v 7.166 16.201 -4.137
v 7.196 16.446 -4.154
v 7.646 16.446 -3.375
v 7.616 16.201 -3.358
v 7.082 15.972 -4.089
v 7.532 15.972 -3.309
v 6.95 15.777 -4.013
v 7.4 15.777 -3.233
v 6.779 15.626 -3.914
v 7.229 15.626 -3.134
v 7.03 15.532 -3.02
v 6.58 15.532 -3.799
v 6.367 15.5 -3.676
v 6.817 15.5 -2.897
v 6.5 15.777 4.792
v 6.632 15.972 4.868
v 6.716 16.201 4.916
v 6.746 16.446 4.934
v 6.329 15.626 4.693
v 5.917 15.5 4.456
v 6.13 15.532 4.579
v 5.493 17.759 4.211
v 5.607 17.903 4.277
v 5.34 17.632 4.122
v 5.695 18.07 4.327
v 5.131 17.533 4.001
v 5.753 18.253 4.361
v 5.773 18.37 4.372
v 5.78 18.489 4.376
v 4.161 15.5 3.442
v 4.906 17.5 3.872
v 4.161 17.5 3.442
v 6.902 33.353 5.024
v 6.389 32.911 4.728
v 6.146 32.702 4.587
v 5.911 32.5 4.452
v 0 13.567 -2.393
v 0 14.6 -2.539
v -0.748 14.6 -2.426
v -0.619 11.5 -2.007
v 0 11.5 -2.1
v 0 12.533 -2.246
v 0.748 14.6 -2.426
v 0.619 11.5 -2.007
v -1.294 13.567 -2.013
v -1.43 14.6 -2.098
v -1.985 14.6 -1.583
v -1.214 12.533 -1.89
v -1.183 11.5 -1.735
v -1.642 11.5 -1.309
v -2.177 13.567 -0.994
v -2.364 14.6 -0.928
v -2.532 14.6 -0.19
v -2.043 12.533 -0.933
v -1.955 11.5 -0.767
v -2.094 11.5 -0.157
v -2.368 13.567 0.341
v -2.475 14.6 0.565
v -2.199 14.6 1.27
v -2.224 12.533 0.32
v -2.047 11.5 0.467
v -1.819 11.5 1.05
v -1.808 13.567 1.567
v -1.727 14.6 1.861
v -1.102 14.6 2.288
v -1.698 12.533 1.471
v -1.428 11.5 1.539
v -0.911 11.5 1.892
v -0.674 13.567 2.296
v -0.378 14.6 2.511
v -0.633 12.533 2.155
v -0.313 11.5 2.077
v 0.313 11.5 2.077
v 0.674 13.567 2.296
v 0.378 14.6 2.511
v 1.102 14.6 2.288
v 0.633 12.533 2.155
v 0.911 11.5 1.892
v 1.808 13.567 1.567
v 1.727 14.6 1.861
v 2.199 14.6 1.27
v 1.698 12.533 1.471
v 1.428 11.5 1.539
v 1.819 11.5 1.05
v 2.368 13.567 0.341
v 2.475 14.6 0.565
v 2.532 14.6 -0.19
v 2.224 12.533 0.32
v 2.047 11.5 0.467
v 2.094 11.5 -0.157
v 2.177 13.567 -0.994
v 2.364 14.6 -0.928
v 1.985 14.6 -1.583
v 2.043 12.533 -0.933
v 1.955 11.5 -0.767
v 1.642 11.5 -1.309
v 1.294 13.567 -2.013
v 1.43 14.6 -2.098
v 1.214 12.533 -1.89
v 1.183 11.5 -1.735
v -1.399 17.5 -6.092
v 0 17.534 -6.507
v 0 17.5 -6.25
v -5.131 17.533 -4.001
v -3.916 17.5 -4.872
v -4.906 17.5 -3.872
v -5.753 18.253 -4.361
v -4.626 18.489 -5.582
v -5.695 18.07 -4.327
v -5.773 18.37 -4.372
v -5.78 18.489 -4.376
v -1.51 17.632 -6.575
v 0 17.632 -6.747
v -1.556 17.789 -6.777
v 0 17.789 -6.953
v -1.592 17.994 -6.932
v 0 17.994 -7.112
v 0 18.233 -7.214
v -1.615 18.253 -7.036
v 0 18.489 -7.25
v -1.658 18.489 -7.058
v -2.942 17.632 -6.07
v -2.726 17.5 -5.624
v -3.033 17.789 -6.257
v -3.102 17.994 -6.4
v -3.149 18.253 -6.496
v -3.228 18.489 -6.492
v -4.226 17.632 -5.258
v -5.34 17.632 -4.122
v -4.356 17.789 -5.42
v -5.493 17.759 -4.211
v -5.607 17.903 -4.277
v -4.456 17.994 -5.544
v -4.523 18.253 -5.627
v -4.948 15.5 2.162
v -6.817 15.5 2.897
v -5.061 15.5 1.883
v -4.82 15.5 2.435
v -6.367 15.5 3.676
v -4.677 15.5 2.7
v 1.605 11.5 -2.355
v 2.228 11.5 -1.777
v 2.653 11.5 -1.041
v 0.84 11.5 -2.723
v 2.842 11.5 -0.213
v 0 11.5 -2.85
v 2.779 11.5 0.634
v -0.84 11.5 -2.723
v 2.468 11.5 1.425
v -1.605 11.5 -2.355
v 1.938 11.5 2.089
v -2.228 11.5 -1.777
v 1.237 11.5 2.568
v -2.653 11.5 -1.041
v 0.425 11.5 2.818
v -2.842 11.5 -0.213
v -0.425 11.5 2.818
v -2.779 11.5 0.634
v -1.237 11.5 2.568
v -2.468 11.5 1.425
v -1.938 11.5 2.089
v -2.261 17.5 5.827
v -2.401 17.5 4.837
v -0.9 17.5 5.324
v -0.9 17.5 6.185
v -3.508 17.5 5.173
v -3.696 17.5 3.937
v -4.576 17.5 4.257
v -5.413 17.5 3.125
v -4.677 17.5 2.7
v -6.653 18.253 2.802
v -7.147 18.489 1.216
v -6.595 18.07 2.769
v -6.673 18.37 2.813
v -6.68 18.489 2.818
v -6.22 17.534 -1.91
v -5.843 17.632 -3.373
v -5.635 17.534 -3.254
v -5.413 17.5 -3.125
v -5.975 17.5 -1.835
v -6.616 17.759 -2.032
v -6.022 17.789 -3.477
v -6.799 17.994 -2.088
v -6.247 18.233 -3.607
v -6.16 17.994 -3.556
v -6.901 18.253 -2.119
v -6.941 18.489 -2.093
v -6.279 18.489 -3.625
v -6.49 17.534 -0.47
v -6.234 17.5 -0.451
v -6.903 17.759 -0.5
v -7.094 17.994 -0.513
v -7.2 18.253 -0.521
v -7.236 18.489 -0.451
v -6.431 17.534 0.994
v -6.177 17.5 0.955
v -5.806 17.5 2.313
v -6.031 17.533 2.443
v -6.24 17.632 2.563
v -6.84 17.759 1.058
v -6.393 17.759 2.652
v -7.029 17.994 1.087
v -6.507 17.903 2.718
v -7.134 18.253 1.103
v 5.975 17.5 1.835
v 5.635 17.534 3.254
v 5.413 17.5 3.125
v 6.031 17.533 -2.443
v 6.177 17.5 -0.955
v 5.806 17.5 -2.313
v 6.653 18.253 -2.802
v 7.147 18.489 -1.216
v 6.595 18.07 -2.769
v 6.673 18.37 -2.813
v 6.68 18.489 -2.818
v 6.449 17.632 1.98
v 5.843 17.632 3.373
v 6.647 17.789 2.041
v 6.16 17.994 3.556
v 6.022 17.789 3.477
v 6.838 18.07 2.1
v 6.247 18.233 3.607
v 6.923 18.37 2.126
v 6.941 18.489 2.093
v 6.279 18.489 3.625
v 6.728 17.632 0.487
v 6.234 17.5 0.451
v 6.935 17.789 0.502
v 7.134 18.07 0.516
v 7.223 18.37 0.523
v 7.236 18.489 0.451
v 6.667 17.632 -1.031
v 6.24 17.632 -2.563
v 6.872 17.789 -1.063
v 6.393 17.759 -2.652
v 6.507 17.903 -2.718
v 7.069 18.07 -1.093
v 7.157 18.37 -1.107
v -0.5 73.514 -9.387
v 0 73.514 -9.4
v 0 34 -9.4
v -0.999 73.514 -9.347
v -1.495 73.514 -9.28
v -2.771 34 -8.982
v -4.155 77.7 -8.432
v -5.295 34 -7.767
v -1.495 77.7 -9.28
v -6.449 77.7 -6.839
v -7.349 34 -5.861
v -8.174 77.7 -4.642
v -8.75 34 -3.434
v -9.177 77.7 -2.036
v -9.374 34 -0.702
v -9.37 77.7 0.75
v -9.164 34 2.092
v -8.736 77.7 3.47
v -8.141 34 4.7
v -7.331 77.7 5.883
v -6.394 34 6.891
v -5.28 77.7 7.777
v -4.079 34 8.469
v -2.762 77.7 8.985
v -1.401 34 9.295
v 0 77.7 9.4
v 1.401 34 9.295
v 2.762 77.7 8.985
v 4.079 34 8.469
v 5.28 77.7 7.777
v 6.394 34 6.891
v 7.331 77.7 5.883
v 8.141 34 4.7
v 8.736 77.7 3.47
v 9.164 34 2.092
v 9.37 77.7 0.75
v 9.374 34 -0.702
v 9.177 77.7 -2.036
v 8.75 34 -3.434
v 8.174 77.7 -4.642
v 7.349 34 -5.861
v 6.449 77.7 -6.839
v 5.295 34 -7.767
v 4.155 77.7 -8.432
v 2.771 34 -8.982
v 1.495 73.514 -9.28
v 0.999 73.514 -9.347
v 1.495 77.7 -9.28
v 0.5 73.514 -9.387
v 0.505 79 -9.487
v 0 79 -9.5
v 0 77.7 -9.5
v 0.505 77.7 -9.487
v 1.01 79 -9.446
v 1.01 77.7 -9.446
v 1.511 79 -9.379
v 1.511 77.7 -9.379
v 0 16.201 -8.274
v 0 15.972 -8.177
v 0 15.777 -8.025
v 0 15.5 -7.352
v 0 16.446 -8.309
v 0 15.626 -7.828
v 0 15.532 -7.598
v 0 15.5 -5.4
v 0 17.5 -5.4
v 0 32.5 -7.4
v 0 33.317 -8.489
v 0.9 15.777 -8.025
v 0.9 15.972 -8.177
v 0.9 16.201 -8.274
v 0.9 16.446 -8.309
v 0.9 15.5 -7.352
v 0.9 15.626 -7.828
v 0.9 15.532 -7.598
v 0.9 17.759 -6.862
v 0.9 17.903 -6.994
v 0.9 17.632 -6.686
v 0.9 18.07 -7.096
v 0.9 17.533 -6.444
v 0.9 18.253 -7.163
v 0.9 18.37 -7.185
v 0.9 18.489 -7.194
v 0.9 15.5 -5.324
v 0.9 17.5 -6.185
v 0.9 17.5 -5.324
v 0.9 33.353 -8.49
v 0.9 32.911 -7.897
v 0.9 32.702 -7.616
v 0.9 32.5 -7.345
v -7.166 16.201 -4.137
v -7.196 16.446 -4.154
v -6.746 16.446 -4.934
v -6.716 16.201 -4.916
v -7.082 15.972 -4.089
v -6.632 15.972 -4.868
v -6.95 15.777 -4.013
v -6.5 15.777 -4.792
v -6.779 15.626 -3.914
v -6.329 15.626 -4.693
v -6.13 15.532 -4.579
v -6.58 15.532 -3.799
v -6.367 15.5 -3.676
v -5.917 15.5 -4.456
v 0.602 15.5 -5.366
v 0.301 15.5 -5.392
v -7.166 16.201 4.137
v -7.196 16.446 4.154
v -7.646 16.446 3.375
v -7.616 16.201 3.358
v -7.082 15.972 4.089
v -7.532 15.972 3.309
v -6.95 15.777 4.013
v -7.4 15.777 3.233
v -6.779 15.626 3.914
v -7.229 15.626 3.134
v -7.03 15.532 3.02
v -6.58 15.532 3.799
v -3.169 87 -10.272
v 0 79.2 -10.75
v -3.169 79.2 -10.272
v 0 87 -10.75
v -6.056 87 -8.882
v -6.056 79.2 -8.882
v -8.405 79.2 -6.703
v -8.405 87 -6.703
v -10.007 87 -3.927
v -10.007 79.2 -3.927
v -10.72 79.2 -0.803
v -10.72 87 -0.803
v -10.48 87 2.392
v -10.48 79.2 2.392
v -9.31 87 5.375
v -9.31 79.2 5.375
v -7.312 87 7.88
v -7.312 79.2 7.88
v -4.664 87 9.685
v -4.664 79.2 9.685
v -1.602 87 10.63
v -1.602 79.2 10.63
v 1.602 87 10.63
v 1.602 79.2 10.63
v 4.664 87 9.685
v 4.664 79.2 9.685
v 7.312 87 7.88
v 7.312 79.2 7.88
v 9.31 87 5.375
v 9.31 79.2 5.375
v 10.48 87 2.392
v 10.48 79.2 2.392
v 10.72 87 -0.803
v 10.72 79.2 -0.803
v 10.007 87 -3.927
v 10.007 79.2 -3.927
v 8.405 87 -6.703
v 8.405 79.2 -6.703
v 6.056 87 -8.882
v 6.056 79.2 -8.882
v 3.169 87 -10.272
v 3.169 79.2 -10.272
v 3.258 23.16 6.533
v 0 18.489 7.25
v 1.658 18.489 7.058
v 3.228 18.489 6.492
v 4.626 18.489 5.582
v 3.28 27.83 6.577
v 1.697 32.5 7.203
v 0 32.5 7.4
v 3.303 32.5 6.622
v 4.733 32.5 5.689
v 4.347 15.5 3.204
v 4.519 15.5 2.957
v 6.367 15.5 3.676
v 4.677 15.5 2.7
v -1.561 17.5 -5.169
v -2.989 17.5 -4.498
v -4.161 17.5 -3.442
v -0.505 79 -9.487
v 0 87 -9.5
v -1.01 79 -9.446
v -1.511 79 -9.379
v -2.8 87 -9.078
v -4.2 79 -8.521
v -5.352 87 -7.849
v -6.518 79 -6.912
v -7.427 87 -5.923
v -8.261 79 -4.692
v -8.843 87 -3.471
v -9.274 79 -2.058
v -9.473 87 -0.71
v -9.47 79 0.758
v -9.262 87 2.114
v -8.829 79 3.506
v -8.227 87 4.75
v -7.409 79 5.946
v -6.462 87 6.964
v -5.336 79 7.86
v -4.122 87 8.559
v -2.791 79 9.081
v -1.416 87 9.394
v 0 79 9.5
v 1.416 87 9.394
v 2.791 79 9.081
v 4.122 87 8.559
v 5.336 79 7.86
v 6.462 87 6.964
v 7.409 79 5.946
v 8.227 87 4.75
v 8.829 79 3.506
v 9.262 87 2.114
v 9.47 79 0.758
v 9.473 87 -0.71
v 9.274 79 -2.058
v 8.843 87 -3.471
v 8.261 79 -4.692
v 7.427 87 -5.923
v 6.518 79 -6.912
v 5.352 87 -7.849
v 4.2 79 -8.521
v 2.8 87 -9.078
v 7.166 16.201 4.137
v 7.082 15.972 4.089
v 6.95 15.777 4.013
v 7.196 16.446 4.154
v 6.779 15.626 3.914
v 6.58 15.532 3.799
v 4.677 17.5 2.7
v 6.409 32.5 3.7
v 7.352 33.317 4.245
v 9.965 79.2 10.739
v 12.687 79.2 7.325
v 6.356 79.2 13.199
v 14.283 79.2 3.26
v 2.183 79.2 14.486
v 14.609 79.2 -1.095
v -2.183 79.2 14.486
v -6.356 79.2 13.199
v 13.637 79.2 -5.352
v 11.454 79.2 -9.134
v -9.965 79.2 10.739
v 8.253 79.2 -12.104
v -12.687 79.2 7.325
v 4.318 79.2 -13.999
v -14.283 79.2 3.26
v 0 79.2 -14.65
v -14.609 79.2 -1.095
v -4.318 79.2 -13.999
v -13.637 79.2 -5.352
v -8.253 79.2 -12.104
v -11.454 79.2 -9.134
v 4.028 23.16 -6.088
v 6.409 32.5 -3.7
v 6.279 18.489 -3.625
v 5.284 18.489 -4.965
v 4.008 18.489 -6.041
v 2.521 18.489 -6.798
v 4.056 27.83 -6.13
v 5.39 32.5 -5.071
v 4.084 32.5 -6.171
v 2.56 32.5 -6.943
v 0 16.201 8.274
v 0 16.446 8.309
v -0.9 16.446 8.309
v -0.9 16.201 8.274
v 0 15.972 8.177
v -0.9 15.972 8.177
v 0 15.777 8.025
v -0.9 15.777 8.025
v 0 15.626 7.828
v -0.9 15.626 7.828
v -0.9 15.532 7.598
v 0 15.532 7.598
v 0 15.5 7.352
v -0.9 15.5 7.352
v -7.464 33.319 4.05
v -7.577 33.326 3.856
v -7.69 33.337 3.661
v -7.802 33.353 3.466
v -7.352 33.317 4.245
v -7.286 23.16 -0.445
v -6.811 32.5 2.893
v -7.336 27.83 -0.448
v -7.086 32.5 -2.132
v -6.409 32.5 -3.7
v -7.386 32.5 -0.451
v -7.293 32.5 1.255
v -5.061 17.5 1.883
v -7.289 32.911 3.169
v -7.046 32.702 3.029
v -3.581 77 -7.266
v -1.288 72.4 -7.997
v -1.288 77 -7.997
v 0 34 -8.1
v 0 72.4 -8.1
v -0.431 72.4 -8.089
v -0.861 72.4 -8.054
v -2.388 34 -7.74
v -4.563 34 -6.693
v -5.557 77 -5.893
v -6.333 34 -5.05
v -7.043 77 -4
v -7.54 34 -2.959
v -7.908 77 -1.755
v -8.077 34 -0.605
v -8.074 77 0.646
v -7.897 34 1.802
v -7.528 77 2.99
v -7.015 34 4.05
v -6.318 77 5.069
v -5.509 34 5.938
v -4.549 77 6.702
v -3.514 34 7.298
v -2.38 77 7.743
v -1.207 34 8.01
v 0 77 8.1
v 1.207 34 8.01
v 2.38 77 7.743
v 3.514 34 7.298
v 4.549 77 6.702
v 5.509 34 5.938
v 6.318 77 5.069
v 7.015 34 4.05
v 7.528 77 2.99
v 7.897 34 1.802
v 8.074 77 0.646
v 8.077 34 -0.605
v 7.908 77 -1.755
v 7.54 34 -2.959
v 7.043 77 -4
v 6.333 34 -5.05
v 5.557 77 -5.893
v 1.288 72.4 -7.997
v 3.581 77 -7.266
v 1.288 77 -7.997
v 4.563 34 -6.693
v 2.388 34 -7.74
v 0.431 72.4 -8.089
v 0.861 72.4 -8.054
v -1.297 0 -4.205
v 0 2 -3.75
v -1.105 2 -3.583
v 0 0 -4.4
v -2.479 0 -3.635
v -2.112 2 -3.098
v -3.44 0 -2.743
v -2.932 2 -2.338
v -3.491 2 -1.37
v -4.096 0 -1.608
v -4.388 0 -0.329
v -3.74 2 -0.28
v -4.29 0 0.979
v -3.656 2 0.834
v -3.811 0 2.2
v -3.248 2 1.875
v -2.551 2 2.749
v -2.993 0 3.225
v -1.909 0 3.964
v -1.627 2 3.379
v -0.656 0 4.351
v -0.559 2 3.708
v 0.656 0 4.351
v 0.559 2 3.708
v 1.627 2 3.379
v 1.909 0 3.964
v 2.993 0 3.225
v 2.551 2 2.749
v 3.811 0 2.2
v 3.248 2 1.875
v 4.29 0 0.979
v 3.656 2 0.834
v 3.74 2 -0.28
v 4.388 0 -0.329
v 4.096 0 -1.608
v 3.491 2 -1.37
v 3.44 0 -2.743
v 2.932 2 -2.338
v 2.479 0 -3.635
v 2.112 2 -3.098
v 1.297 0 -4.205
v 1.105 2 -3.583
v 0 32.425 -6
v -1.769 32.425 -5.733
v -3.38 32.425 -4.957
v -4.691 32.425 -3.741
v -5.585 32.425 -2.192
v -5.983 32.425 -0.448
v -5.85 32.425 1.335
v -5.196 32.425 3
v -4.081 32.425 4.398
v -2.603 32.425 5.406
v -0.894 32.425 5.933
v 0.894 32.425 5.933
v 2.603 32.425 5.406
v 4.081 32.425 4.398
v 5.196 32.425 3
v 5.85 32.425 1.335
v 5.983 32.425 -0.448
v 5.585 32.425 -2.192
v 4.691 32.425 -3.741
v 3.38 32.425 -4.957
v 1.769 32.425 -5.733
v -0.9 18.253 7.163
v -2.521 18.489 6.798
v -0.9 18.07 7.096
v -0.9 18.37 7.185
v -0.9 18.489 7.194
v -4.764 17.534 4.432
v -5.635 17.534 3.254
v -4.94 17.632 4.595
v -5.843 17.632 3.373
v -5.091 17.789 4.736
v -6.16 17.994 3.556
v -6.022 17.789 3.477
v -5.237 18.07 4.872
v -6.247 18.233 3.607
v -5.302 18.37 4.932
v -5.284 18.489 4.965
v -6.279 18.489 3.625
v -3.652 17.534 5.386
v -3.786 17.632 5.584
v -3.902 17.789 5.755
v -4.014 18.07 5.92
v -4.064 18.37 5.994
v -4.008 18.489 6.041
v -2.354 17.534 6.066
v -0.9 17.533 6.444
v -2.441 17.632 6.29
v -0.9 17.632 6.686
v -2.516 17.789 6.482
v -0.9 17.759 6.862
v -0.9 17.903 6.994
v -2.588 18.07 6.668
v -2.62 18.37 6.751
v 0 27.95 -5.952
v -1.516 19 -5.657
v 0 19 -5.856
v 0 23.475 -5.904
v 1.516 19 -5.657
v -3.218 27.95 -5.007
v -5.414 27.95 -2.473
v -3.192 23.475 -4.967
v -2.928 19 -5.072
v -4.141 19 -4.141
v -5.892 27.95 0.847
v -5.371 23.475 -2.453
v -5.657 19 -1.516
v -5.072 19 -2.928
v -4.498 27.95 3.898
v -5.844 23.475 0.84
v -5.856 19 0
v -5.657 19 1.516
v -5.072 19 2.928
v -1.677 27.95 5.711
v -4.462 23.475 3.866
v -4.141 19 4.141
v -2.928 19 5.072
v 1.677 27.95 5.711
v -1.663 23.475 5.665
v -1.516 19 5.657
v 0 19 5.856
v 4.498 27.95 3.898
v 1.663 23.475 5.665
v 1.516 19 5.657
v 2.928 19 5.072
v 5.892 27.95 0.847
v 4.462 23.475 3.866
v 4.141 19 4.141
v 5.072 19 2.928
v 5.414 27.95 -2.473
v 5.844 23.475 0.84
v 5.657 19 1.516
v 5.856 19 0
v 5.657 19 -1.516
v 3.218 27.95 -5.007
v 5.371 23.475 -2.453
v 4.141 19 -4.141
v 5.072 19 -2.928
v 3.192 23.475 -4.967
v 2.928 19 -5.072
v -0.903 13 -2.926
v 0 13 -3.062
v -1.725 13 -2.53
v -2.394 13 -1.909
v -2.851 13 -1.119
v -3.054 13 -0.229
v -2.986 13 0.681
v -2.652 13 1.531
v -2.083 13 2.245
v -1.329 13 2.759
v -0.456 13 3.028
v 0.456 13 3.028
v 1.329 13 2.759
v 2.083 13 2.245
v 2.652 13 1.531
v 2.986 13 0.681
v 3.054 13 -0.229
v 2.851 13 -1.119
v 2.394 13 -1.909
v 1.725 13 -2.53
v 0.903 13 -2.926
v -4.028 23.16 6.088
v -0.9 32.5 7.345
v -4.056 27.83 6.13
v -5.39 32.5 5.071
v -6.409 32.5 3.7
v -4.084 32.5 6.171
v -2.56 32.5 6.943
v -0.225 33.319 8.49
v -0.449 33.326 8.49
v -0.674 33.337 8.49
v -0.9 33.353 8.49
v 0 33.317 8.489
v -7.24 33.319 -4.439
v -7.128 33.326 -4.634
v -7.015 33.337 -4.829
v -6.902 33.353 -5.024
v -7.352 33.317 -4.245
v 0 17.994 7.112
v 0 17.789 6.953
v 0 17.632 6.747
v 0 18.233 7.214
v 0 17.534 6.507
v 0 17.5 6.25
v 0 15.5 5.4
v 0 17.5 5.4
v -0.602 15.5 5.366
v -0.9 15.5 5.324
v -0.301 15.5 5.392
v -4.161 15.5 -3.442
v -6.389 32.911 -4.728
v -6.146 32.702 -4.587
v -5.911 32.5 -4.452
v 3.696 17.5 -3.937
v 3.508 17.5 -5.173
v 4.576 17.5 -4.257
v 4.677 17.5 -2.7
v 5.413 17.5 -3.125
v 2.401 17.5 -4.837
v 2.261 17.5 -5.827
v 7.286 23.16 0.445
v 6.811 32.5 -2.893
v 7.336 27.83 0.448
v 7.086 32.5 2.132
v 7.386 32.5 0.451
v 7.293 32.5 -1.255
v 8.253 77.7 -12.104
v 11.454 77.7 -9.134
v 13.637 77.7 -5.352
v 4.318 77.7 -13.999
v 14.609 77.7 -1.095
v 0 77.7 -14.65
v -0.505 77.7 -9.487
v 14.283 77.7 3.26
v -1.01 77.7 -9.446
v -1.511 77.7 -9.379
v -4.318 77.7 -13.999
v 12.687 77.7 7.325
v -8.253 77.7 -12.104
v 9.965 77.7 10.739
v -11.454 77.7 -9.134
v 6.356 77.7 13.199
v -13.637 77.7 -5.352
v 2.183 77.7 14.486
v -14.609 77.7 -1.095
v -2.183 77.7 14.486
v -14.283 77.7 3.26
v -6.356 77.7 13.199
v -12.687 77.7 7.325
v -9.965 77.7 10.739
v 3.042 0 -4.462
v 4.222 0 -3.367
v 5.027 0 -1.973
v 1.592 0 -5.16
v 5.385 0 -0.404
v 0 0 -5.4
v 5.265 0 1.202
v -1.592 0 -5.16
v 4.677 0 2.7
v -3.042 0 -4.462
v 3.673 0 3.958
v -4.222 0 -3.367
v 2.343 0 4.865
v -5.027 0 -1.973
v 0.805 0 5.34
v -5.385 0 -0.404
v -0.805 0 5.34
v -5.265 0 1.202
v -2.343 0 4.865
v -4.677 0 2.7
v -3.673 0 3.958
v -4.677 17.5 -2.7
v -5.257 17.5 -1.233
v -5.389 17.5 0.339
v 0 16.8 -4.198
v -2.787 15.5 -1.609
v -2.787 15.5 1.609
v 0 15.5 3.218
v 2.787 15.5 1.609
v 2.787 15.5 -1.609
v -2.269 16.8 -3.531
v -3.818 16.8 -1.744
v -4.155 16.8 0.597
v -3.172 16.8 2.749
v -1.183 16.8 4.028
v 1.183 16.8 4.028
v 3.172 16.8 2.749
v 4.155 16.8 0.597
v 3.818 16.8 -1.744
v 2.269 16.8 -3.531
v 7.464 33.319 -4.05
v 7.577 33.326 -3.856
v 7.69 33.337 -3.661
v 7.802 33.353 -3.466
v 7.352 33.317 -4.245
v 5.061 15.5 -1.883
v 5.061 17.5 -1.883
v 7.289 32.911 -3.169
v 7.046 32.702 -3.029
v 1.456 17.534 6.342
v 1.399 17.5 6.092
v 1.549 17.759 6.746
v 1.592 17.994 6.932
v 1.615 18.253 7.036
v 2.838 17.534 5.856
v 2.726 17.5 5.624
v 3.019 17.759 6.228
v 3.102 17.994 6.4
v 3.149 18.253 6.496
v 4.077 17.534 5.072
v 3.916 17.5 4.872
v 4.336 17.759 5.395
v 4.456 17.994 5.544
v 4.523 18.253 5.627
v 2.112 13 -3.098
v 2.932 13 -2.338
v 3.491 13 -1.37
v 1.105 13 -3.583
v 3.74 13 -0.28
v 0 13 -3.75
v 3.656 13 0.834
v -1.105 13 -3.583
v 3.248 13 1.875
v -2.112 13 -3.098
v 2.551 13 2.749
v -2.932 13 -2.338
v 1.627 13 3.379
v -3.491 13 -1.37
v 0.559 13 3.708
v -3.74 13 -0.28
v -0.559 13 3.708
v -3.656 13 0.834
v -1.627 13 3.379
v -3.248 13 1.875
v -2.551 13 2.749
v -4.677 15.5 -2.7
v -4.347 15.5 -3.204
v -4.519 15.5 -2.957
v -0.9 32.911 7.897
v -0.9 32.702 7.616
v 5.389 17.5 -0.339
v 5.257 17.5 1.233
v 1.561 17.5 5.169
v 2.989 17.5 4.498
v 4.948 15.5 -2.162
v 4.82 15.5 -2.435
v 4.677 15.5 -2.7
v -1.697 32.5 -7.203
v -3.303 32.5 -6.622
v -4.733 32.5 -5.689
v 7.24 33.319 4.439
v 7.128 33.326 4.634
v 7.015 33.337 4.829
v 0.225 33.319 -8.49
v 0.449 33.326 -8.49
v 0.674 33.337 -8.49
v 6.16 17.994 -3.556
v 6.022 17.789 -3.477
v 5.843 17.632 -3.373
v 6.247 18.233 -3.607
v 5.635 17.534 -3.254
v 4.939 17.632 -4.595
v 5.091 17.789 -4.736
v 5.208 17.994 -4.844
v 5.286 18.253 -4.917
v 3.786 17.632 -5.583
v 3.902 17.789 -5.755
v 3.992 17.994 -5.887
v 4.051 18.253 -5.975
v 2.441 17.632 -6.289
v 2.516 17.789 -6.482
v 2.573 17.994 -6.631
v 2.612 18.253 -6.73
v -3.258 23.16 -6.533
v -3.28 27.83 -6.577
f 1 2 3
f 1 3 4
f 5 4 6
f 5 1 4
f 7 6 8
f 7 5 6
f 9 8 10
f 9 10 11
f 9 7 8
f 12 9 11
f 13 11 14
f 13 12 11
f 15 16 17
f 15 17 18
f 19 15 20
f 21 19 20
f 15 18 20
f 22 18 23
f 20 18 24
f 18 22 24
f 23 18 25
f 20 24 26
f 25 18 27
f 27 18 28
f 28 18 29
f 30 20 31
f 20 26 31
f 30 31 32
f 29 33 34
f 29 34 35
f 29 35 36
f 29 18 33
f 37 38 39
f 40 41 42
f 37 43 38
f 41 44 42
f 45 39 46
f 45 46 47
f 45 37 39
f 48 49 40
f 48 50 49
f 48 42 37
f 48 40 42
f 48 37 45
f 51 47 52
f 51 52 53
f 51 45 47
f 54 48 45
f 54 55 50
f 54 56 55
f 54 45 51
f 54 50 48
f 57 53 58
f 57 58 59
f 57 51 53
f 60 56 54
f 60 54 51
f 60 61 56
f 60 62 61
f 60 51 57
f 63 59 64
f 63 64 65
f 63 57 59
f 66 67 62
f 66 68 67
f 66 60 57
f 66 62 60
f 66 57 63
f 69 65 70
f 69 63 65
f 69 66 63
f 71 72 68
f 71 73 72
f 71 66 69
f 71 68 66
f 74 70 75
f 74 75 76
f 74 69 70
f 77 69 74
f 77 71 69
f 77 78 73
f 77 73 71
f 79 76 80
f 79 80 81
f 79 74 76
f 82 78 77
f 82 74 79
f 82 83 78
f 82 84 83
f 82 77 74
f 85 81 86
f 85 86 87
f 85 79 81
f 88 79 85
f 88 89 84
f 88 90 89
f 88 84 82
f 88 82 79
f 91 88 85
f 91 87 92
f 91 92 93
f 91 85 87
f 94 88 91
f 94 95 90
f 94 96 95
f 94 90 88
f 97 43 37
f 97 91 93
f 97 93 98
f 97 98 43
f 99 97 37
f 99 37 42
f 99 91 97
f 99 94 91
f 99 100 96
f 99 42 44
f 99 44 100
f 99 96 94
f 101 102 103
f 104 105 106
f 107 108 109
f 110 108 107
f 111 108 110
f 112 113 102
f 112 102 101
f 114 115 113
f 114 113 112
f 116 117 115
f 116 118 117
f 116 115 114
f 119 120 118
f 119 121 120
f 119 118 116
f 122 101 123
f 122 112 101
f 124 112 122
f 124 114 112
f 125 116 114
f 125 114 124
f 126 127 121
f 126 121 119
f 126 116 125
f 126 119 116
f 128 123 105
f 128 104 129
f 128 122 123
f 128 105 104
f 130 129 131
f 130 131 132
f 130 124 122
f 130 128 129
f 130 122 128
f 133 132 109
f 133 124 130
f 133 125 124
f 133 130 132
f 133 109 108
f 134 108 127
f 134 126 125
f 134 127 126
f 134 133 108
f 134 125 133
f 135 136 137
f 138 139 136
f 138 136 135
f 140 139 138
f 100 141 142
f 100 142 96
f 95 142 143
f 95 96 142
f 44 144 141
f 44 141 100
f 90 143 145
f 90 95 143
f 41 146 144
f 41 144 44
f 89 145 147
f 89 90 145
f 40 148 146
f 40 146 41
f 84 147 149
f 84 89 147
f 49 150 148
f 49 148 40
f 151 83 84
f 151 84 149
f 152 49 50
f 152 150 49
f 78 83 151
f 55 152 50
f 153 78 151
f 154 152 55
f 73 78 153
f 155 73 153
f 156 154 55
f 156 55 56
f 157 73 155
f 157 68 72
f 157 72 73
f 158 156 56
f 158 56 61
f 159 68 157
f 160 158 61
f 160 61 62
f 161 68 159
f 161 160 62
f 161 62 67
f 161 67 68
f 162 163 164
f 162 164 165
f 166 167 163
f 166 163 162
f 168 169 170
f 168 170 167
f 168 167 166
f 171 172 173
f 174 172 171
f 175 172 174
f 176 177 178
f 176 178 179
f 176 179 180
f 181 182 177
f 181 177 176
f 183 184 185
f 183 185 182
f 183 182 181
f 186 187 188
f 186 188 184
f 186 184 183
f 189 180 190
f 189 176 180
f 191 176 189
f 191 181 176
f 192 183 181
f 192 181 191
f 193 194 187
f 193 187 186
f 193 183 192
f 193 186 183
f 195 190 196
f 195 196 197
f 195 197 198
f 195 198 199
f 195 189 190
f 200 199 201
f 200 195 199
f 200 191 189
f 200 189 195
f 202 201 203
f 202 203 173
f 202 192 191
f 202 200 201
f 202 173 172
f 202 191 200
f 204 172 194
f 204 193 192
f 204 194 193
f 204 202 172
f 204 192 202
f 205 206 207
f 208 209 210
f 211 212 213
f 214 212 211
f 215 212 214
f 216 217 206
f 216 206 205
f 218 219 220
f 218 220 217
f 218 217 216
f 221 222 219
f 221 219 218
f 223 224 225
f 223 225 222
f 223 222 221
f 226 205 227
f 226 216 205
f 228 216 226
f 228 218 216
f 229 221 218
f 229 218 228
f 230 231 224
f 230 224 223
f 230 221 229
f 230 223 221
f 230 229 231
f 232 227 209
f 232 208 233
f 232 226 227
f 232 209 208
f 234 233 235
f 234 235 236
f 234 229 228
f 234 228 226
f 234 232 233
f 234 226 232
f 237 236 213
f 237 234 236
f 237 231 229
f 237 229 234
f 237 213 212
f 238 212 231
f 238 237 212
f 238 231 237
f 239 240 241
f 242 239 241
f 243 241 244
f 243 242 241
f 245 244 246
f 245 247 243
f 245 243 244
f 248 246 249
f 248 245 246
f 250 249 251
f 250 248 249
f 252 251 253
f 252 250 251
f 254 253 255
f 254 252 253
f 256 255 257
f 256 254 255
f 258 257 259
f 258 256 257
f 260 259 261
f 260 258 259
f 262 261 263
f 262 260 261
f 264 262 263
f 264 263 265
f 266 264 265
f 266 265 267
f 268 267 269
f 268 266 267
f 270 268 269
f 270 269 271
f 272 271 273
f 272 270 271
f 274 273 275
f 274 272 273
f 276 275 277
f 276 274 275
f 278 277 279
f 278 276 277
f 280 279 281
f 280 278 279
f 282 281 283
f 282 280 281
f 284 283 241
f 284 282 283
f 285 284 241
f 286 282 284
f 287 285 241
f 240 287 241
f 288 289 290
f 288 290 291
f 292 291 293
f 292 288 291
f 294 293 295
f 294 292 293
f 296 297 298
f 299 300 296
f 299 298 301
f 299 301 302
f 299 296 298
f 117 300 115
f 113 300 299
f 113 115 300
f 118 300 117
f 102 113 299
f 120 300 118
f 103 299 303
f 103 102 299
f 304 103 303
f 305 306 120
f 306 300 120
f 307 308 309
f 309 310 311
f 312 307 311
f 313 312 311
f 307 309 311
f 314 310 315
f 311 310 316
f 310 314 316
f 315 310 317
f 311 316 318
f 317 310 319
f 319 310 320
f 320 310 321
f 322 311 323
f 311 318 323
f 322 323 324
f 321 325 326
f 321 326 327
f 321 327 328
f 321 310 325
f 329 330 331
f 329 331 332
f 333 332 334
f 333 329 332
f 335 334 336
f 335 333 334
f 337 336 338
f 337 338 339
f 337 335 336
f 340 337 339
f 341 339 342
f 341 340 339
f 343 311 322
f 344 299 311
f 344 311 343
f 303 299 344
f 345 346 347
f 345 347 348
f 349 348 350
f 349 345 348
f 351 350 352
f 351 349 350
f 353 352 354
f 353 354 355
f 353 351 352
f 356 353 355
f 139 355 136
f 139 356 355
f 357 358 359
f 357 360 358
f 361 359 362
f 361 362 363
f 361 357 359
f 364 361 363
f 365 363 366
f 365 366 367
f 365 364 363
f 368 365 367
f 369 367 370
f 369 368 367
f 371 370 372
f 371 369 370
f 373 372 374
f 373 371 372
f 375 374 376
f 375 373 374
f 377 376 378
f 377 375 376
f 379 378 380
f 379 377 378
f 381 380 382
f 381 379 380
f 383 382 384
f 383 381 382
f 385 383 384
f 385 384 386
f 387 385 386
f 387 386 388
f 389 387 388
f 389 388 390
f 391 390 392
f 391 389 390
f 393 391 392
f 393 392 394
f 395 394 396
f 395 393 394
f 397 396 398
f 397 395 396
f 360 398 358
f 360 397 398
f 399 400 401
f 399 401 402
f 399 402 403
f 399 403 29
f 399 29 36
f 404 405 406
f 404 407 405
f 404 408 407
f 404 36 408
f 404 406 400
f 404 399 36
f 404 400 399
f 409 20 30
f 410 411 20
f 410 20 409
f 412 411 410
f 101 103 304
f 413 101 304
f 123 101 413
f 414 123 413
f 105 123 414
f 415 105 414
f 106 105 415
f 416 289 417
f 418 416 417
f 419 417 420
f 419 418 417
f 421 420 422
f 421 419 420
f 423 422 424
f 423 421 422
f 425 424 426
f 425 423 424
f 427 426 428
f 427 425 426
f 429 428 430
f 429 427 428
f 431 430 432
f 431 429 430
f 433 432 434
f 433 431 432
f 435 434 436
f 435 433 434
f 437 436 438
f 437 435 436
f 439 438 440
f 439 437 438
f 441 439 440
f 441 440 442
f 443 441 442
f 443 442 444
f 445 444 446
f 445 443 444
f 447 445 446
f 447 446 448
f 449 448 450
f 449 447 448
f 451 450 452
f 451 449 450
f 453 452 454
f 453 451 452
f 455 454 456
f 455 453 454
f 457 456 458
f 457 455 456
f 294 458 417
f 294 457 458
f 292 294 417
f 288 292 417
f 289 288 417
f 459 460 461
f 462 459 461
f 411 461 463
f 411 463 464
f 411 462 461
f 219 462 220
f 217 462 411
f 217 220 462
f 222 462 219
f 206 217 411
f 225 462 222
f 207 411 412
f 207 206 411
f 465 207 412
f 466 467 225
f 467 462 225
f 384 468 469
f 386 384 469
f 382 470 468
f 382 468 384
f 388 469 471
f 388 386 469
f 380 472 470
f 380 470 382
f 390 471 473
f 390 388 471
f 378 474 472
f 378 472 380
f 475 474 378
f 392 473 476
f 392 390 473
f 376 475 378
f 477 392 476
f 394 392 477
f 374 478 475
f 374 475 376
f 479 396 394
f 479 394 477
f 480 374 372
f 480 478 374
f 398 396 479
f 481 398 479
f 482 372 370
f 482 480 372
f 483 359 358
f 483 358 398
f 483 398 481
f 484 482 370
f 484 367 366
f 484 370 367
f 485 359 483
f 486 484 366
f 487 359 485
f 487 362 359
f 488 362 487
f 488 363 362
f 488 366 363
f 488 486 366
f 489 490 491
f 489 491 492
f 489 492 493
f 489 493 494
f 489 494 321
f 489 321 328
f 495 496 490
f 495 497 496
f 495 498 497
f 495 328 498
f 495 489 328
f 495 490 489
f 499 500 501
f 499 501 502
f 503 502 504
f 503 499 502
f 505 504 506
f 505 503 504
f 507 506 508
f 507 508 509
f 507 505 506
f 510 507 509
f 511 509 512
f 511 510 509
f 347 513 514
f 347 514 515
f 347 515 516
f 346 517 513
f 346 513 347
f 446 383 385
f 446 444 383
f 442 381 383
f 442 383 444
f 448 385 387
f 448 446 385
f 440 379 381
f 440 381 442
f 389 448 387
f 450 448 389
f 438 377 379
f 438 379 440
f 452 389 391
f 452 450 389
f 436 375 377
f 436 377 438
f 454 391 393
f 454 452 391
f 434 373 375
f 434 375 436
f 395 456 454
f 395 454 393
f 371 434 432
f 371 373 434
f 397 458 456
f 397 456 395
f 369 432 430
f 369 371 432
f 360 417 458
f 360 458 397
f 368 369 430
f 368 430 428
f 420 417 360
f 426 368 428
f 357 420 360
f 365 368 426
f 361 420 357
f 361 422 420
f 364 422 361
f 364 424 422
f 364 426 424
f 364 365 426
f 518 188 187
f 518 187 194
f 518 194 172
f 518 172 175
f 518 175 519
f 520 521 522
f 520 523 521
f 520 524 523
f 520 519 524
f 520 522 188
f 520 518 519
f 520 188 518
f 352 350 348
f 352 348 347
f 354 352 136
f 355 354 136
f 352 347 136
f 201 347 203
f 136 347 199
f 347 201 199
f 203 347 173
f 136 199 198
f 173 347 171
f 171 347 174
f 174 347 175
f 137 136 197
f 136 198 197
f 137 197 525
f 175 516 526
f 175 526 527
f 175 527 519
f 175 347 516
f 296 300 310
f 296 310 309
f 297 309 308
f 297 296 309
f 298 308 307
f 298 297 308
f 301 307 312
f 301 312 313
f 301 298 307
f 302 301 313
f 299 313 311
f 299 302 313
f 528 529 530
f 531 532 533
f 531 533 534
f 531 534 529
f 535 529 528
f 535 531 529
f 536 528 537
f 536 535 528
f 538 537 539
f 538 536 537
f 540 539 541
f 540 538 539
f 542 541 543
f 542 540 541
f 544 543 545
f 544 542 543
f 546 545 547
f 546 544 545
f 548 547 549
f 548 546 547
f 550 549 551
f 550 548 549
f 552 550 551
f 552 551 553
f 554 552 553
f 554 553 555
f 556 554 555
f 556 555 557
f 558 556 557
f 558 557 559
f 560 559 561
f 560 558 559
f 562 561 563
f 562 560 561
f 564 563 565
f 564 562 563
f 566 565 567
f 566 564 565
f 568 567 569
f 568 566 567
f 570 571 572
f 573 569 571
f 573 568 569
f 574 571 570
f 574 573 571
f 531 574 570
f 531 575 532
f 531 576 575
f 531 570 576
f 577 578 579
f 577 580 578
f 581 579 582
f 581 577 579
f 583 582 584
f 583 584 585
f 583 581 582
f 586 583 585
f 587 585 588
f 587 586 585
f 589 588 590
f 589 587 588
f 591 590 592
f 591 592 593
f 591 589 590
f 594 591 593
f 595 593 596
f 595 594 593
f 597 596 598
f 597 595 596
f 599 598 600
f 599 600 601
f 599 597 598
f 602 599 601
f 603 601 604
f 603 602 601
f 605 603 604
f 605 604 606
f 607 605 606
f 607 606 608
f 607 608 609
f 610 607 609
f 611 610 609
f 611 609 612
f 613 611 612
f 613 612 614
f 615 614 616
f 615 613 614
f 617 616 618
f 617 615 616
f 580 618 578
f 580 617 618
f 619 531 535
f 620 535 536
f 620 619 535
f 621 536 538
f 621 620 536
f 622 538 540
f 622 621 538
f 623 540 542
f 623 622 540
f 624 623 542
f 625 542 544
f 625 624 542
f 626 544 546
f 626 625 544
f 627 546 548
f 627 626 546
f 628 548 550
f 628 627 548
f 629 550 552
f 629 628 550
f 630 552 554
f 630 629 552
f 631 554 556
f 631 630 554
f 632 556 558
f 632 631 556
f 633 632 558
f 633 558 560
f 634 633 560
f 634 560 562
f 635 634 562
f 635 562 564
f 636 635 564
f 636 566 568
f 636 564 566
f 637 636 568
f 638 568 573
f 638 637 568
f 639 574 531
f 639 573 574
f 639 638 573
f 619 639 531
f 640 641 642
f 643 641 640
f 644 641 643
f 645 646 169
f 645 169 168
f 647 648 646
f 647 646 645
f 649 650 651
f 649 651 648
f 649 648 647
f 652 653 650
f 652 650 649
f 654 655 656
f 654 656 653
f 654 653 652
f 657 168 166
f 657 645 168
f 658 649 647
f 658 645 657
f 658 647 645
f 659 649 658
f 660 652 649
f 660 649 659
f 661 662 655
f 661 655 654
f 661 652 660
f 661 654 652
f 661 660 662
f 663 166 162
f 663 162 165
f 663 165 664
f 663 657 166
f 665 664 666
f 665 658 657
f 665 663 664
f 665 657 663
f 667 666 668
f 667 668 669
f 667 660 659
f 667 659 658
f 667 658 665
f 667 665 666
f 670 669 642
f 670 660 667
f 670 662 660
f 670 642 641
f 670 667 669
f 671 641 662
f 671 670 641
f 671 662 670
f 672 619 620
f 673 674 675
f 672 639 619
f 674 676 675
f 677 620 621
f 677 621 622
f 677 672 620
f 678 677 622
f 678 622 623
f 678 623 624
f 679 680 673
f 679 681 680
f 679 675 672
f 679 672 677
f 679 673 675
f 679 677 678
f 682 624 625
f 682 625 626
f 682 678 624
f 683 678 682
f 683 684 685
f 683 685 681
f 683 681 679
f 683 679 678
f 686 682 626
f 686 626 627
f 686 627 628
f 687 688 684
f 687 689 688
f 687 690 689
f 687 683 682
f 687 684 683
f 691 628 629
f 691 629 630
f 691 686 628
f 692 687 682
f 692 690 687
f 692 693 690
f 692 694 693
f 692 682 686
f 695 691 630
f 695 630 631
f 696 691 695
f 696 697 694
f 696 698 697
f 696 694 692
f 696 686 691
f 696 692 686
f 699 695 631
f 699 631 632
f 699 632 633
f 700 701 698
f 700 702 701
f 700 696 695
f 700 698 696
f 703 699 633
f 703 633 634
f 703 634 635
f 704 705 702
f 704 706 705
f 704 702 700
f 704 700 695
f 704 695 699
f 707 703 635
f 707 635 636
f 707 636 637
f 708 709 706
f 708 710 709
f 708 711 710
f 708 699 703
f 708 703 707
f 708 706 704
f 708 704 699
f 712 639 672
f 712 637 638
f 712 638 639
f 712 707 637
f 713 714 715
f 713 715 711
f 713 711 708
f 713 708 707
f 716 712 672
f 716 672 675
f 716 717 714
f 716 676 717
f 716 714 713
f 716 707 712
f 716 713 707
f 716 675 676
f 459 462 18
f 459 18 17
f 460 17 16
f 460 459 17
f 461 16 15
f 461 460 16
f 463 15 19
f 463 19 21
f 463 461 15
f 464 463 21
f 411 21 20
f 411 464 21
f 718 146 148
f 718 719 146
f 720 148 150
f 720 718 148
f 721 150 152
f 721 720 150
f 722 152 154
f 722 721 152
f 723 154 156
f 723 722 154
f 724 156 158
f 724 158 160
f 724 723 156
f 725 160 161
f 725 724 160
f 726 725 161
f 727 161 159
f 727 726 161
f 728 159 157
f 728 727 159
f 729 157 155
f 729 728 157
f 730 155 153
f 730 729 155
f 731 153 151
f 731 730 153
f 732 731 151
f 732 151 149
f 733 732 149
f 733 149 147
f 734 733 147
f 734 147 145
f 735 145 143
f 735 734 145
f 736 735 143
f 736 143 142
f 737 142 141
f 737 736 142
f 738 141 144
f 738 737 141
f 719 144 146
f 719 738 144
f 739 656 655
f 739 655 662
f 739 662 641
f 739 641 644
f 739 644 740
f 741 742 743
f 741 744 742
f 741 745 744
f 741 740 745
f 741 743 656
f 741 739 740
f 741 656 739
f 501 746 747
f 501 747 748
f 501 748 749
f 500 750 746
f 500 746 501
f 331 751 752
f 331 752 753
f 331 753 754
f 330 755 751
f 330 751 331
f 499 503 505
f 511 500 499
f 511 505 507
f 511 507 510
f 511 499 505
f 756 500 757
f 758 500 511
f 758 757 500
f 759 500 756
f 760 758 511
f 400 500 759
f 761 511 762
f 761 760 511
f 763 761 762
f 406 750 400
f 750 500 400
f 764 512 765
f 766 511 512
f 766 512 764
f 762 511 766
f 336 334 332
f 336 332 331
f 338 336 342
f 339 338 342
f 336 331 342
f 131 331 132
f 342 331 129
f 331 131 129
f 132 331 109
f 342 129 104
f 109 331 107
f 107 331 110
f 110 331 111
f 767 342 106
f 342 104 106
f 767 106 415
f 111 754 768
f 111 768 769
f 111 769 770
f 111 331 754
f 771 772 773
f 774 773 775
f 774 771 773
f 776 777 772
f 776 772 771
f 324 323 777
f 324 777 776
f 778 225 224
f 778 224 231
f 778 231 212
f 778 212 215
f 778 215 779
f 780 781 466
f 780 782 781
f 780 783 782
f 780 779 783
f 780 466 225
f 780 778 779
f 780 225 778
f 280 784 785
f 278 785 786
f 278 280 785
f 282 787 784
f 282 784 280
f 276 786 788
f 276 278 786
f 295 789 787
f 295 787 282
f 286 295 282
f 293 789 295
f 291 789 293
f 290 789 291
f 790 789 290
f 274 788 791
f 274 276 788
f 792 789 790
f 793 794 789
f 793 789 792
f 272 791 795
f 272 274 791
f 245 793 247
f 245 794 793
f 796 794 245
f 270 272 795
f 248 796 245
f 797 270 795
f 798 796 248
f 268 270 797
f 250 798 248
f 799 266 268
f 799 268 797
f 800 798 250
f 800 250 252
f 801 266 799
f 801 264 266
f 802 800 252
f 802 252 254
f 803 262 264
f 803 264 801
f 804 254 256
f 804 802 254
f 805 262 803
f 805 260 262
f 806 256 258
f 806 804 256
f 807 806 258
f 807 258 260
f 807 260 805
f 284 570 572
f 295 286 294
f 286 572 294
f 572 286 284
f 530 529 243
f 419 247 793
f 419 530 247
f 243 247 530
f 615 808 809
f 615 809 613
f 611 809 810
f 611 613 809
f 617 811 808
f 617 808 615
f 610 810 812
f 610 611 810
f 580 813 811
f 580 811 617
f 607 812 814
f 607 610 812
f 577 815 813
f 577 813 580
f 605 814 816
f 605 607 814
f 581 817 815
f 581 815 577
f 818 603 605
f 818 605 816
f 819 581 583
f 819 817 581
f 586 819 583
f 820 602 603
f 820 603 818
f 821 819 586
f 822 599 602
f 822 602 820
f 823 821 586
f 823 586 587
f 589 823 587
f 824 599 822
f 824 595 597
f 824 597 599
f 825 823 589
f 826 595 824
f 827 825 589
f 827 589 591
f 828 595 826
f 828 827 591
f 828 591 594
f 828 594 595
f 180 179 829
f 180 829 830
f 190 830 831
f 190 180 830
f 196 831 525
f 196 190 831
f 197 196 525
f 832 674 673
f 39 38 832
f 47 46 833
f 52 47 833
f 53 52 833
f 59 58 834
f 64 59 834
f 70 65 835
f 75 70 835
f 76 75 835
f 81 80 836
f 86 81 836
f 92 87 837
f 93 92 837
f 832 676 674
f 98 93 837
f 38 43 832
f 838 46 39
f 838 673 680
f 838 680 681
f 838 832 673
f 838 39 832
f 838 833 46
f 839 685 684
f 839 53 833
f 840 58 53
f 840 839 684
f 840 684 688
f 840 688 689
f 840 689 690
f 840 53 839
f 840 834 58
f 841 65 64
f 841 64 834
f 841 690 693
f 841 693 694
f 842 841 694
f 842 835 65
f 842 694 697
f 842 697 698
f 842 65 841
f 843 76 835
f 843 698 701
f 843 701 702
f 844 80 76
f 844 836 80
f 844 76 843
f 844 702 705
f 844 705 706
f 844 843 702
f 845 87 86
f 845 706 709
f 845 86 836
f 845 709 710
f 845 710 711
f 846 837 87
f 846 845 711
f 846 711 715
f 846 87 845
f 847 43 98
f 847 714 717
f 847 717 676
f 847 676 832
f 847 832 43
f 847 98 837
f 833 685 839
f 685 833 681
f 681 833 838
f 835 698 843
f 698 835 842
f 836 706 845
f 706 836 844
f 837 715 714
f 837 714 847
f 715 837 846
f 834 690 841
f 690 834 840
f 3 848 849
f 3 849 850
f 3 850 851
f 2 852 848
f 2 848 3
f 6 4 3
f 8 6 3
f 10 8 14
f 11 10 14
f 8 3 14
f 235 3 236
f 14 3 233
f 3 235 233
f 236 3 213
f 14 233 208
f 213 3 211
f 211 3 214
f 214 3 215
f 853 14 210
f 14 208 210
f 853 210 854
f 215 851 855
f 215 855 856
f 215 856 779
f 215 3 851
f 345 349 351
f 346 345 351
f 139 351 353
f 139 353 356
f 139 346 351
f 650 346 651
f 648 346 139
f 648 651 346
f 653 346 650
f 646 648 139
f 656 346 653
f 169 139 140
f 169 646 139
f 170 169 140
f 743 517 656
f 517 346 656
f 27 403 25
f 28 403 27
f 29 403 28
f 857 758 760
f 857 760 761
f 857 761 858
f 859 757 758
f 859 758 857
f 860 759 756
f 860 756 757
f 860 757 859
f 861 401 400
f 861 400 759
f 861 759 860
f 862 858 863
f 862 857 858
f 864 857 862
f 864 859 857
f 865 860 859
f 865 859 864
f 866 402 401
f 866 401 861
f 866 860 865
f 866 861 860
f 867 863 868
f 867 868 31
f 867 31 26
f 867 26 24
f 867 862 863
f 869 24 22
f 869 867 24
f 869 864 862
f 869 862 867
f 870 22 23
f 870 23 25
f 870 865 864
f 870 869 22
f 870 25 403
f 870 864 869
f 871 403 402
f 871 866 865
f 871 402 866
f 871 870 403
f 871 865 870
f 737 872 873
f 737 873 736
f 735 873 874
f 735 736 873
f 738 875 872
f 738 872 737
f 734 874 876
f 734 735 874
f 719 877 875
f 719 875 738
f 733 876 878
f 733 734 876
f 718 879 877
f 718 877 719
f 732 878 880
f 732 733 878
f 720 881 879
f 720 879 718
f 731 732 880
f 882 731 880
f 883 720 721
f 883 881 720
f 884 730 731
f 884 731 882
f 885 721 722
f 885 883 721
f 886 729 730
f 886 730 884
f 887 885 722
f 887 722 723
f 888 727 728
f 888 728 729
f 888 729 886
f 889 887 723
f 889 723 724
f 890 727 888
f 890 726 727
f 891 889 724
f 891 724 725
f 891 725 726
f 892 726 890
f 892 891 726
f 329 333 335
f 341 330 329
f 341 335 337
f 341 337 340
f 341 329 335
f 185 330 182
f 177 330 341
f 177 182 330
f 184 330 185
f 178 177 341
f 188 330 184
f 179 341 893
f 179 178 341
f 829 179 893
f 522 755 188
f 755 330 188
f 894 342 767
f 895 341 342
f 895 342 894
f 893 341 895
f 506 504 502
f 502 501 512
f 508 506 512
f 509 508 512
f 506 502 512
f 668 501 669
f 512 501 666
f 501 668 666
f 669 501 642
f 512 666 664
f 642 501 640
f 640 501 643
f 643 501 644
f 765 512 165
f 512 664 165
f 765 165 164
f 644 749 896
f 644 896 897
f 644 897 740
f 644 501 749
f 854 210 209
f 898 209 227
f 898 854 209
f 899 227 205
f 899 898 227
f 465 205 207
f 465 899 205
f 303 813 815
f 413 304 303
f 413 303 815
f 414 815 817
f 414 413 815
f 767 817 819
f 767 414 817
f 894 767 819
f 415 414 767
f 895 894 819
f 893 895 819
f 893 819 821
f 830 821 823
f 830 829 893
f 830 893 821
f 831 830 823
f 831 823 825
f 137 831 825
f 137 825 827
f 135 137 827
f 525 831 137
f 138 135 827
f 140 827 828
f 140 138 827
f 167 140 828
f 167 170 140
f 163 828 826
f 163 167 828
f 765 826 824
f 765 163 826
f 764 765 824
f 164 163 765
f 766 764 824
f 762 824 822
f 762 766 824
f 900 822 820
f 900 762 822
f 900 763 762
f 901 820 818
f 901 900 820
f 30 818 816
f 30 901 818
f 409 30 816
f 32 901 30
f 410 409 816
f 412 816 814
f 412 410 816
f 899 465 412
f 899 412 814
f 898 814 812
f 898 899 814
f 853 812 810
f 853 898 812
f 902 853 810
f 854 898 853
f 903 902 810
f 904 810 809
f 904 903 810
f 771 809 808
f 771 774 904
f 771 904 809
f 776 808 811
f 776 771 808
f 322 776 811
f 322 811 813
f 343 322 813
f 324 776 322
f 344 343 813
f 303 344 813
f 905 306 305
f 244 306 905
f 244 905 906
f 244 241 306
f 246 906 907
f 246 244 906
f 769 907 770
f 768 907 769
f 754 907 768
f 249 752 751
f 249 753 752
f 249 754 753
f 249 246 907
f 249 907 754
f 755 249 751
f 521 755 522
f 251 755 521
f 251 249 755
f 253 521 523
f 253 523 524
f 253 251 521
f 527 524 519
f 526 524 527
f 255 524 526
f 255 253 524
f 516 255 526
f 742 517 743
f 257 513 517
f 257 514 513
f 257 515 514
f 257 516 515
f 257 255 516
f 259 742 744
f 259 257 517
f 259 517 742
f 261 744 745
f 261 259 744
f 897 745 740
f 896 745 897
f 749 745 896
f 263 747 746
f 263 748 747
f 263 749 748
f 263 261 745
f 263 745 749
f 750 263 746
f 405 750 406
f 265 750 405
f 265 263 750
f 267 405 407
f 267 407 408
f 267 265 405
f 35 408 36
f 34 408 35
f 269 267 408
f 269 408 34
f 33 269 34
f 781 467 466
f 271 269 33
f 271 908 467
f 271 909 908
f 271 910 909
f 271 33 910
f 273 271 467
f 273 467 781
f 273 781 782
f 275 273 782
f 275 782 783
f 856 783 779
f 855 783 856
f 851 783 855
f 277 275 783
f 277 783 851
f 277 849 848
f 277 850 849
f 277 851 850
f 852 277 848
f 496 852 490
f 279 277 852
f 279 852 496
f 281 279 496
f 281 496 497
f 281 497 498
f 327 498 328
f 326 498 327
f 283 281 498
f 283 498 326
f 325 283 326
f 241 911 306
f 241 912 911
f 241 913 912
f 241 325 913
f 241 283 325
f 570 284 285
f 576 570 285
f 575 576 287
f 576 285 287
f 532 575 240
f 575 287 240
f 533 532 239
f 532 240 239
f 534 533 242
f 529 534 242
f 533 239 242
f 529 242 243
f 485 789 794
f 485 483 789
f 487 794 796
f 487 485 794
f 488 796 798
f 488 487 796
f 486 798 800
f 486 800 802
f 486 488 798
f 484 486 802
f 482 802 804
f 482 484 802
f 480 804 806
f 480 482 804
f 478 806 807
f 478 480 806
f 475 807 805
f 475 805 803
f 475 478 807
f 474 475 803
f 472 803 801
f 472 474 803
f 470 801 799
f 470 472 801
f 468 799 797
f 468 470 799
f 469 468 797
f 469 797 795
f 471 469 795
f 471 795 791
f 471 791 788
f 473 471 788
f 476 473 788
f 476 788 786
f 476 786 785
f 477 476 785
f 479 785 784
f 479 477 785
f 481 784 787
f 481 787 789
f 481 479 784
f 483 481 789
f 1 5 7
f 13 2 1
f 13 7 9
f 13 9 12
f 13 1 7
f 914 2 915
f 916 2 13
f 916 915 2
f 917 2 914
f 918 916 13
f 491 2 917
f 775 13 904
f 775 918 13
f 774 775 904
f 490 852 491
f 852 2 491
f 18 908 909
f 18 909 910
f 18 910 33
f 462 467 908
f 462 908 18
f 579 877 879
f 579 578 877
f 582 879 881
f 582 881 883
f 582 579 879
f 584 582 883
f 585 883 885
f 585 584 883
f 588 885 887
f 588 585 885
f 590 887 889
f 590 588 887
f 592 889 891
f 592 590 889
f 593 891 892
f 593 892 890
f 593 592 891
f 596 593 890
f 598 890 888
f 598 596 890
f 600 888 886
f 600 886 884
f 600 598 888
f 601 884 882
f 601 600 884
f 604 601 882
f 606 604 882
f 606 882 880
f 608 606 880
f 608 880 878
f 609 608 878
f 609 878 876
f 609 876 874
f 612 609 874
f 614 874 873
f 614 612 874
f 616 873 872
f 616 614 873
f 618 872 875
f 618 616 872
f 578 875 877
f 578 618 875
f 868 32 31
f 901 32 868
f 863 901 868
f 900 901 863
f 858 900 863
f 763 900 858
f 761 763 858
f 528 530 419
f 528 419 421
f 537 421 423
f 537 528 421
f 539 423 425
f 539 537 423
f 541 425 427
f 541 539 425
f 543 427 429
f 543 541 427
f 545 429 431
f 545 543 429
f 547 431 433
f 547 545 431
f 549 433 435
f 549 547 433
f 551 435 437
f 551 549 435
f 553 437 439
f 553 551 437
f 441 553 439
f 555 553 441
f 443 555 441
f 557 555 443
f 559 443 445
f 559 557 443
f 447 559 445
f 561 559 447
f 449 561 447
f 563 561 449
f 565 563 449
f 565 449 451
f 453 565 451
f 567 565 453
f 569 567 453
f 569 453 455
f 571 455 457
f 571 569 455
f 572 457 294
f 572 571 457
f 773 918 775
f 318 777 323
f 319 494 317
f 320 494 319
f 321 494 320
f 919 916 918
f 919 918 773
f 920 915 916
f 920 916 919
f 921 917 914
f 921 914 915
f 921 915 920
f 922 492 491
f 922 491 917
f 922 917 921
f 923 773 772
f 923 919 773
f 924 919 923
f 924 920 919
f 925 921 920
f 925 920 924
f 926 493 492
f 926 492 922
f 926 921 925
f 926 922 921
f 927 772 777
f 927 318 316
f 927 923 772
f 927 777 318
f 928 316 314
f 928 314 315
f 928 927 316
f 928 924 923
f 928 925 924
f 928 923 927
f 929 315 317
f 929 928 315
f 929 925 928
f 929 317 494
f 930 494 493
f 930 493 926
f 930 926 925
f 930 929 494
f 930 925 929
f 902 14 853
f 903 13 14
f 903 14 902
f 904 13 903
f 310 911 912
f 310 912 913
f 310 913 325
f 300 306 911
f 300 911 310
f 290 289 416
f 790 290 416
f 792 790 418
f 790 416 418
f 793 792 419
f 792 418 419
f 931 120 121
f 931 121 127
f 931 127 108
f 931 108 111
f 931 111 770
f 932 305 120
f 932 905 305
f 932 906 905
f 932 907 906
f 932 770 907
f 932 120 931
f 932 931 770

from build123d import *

# Parameters (mm, degrees)
BOSS_EXTRUDE2_DEPTH = 0.9
CIRPATTERN1_COUNT   = 6
CUT_REVOLVE2_ANGLE  = 18.3


with BuildPart() as part:
    # Sketch3 → Revolve2 (revolve)
    with BuildSketch(Plane(origin=(0, 0, 0), x_dir=(0, 0, -1), z_dir=(1, 0, 0))):
        with BuildLine():
            Line((5.4, 0), (5.4, 17.5))
            Line((5.4, 17.5), (6.250057305, 17.5))
            ThreePointArc((6.250057305, 17.5), (6.953368941, 17.789118334), (7.25, 18.489294515))
            Line((7.25, 18.489294515), (7.4, 32.5))
            Line((7.4, 32.5), (9.4, 34))
            Line((9.4, 34), (9.4, 77.7))
            Line((9.4, 77.7), (14.65, 77.7))
            Line((14.65, 77.7), (14.65, 79.2))
            Line((14.65, 79.2), (10.75, 79.2))
            Line((10.75, 79.2), (10.75, 87))
            Line((10.75, 87), (9.5, 87))
            Line((9.5, 87), (9.5, 79))
            Line((9.5, 79), (8.1, 77))
            Line((8.1, 77), (8.1, 34))
            Line((8.1, 34), (6, 32.425))
            Line((6, 32.425), (5.856270621, 19))
            Line((5.856270621, 19), (2.539122418, 14.6))
            Line((2.539122418, 14.6), (2.1, 11.5))
            Line((2.1, 11.5), (2.85, 11.5))
            Line((2.85, 11.5), (3.062478589, 13))
            Line((3.062478589, 13), (3.75, 13))
            Line((3.75, 13), (3.75, 2))
            Line((3.75, 2), (4.4, 0))
            Line((4.4, 0), (5.4, 0))
        make_face()
    revolve(axis=Axis((0, 0, 0), (0, 1, 0)))

    # Sketch4 → Boss-Extrude2 (add)
    with BuildSketch(Plane(origin=(0, 0, 0), x_dir=(0, 0, -1), z_dir=(1, 0, 0))):
        with BuildLine():
            Line((8.5, 34.3), (8.308857775, 16.446417237))
            ThreePointArc((8.308857775, 16.446417237), (8.025083083, 15.776587579), (7.352253864, 15.5))
            Line((7.352253864, 15.5), (3.217630005, 15.5))
            Line((3.217630005, 15.5), (5.856270621, 19))
            Line((5.856270621, 19), (6, 32.425))
            Line((6, 32.425), (8.5, 34.3))
        make_face()
    boss_extrude2 = extrude(amount=BOSS_EXTRUDE2_DEPTH)

    # CirPattern1: Boss-Extrude2 ×6 about axis
    cirpattern1_axis = Axis((0, 0, 0), (0, 1, 0))
    for i in range(1, CIRPATTERN1_COUNT):
        add(boss_extrude2.rotate(cirpattern1_axis, i * 360 / CIRPATTERN1_COUNT))

    # Sketch6 → Cut-Revolve2 (revolve, symmetric, cut)
    with BuildSketch(Plane(origin=(0, 0, 0), x_dir=(0, 0, -1), z_dir=(1, 0, 0))) as cut_revolve2_sk:
        Polygon((8.1, 77), (8.1, 72.4), (9.5, 73.6), (9.5, 79), align=None)
    revolve(axis=Axis((0, 0, 0), (0, 1, 0)), revolution_arc=CUT_REVOLVE2_ANGLE / 2, mode=Mode.SUBTRACT)
    revolve(cut_revolve2_sk.sketch, axis=Axis((0, 0, 0), (0, -1, 0)), revolution_arc=CUT_REVOLVE2_ANGLE / 2, mode=Mode.SUBTRACT)


solid = part.part
